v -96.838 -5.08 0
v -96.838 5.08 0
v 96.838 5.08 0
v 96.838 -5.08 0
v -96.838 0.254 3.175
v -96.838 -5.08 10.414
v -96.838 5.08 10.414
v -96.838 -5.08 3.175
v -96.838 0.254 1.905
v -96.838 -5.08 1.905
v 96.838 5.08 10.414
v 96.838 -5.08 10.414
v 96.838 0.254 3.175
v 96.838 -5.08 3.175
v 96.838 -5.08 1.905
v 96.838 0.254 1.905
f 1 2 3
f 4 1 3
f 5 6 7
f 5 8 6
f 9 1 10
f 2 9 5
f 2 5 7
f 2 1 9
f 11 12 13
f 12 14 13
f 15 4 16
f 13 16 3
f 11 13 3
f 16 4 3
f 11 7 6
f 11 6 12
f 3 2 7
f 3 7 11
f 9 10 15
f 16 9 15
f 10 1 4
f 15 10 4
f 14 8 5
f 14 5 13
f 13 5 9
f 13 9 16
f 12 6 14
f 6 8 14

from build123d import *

# Parameters (mm, degrees)
SKETCH1_W           = 193.675
SKETCH1_H           = 10.16
BOSS_EXTRUDE1_DEPTH = 5.08
SKETCH2_W           = 193.675
SKETCH2_H           = 1.27
CUT_EXTRUDE1_DEPTH  = 5.334
SKETCH3_W           = 193.675
SKETCH3_H           = 10.16
BOSS_EXTRUDE2_DEPTH = 5.334


with BuildPart() as part:
    # Sketch1 → Boss-Extrude1 (new body)
    with BuildSketch(Plane.XY):
        Rectangle(SKETCH1_W, SKETCH1_H)
    extrude(amount=BOSS_EXTRUDE1_DEPTH)

    # Sketch2 → Cut-Extrude1 (cut)
    with BuildSketch(Plane.XZ.offset(5.08)):
        with Locations((0, 2.54)):
            Rectangle(SKETCH2_W, SKETCH2_H)
    extrude(amount=-CUT_EXTRUDE1_DEPTH, mode=Mode.SUBTRACT)

    # Sketch3 → Boss-Extrude2 (add)
    with BuildSketch(Plane.XY.offset(5.08)):
        Rectangle(SKETCH3_W, SKETCH3_H)
    extrude(amount=BOSS_EXTRUDE2_DEPTH)


solid = part.part
